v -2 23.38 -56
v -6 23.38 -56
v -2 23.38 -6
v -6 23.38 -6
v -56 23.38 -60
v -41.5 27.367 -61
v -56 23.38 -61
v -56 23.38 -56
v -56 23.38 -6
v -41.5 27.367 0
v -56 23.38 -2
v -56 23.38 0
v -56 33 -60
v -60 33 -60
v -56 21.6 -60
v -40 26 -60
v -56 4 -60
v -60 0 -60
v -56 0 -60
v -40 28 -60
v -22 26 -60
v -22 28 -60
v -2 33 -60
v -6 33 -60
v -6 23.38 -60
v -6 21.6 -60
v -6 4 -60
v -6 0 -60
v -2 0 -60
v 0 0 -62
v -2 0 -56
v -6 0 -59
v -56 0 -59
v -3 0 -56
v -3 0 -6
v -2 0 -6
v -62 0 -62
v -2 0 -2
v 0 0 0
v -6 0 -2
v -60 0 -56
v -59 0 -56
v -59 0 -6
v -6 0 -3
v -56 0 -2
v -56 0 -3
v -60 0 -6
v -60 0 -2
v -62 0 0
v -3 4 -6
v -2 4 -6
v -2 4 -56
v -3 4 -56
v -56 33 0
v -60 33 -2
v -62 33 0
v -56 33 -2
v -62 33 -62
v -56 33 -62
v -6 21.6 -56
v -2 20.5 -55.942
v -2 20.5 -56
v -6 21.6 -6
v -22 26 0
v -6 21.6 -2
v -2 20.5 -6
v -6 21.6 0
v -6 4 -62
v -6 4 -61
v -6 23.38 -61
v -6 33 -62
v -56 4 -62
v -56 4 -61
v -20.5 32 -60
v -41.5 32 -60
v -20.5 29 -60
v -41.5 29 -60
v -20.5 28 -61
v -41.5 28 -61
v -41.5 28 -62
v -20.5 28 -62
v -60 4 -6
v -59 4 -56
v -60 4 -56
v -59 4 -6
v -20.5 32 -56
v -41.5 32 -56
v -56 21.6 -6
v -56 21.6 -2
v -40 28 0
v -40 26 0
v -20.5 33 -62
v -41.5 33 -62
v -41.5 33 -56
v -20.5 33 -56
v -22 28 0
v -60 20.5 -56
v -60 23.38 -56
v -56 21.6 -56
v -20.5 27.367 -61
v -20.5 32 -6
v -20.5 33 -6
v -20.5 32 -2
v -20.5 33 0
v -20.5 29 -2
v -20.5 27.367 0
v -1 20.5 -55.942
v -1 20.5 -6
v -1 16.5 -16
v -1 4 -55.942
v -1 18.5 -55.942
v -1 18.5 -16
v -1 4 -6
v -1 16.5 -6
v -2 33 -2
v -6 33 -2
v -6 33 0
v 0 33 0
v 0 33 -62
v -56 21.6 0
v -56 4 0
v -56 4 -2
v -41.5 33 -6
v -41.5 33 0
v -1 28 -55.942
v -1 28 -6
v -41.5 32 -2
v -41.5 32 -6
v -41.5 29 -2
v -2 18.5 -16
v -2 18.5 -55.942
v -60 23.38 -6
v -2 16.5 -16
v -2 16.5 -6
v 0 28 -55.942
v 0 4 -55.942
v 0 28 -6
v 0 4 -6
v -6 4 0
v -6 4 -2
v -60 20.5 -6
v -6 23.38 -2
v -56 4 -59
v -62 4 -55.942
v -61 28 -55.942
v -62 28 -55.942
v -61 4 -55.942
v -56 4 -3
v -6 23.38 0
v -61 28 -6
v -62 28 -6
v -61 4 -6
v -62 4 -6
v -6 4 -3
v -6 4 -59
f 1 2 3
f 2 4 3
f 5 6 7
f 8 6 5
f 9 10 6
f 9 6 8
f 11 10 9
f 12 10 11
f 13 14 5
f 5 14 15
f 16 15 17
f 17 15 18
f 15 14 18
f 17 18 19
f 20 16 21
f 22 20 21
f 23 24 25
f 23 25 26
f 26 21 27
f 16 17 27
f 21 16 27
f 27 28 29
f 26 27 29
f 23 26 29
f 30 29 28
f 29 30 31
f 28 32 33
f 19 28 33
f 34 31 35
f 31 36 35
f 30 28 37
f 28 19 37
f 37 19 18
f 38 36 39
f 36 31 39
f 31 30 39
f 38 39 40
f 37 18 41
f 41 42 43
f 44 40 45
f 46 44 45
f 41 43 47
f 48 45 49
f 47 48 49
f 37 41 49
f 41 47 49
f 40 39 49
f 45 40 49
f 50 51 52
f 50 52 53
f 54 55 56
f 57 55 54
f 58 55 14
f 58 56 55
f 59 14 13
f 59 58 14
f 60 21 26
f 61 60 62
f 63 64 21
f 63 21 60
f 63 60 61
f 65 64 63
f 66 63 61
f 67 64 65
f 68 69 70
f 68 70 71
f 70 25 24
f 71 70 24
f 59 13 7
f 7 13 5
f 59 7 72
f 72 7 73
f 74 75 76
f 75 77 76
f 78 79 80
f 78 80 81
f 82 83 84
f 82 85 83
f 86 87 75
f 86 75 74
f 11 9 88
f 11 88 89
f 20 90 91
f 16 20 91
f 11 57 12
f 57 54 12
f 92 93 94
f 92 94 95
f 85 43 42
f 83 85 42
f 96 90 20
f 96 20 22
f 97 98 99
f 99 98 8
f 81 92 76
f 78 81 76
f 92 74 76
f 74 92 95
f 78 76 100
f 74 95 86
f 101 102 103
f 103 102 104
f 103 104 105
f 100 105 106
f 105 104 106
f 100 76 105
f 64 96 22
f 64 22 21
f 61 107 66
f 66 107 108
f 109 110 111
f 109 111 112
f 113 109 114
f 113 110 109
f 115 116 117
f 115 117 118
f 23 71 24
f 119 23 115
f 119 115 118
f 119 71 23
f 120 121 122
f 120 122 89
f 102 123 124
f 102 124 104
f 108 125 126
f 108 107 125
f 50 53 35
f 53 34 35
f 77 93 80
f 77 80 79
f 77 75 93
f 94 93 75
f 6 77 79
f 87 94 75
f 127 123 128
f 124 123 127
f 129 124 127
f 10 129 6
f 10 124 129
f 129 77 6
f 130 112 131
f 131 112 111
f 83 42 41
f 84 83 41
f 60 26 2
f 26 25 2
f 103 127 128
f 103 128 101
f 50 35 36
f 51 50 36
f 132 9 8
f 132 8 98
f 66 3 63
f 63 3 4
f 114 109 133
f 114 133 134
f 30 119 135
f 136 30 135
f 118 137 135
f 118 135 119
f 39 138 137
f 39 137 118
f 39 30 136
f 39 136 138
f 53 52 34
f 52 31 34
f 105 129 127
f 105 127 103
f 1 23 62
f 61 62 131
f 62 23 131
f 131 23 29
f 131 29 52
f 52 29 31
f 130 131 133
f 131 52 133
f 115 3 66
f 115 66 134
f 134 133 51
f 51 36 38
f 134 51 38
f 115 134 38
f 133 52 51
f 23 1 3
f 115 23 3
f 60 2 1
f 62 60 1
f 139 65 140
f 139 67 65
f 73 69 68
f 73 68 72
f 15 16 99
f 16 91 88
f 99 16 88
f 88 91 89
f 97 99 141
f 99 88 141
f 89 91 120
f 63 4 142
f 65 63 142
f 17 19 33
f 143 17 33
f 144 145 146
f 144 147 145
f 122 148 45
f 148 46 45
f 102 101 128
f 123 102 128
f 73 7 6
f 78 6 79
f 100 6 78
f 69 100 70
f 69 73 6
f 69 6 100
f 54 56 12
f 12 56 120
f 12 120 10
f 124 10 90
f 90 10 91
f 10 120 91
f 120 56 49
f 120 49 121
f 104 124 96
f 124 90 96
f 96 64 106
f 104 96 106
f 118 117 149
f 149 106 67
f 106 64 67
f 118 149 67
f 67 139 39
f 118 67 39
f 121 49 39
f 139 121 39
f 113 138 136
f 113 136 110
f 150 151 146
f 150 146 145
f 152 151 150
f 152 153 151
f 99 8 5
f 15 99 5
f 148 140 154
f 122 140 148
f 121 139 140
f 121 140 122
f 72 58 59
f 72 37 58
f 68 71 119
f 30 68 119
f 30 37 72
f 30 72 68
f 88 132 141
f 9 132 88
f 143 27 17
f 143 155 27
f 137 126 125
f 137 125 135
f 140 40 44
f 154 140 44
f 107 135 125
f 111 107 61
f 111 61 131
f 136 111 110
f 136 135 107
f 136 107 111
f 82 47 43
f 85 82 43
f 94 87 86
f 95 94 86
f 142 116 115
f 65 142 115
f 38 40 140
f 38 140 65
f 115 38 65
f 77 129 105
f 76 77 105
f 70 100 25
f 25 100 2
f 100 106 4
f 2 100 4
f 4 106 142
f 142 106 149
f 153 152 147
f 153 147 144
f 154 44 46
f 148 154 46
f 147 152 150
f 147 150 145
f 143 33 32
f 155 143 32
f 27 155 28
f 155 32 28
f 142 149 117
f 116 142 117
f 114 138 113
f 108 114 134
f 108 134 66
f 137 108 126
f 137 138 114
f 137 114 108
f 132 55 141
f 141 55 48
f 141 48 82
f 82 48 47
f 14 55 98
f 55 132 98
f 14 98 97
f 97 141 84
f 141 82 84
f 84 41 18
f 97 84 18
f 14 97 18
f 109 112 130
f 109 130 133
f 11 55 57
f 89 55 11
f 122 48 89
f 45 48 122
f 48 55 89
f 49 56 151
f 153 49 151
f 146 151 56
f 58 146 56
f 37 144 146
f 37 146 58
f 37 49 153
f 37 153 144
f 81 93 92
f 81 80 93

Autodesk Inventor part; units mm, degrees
ref_plane "YZ Plane" through (0, 0, 0) normal (1, 0, 0) x (0, 1, 0)
ref_plane "XZ Plane" through (0, 0, 0) normal (0, 1, 0) x (-1, 0, 0)
ref_plane "XY Plane" through (0, 0, 0) normal (0, 0, 1) x (1, 0, 0)
sketch "Skizze1" plane through (0, 0, 0) normal (0, 1, 0) x (-1, 0, 0)
  line L0 (0, 0) -> (62, 0)
  line L1 (62, 0) -> (62, -62)
  line L2 (62, -62) -> (0, -62)
  line L3 (0, -62) -> (0, 0)
  line L4 (2, -2) -> (6, -2)
  line L5 (6, -2) -> (6, -6)
  line L6 (6, -6) -> (2, -6)
  line L7 (2, -6) -> (2, -2)
  line L8 (2, -56) -> (6, -56)
  line L9 (6, -56) -> (6, -60)
  line L10 (6, -60) -> (2, -60)
  line L11 (2, -60) -> (2, -56)
  line L12 (56, -2) -> (60, -2)
  line L13 (60, -2) -> (60, -6)
  line L14 (60, -6) -> (56, -6)
  line L15 (56, -6) -> (56, -2)
  line L16 (56, -56) -> (60, -56)
  line L17 (60, -56) -> (60, -60)
  line L18 (60, -60) -> (56, -60)
  line L19 (56, -60) -> (56, -56)
  line L20 (3, -3) -> (59, -3)
  line L21 (59, -3) -> (59, -59)
  line L22 (59, -59) -> (3, -59)
  line L23 (3, -59) -> (3, -3)
  point P0 (2, -58)
  point P1 (6, -3)
  point P2 (56, -3)
  point P3 (59, -6)
  point P4 (59, -56)
  point P5 (56, -59)
  point P6 (6, -59)
  point P7 (3, -56)
  point P8 (3, -6)
  dimension "d0" = 62
  dimension "d1" = 62
  dimension "d2" = 4
  dimension "d3" = 4
  dimension "d4" = 4
  dimension "d5" = 4
  dimension "d6" = 4
  dimension "d7" = 50
  dimension "d8" = 50
  dimension "d9" = 2
  dimension "d10" = 2
  dimension "d11" = 2
  dimension "d12" = 56
  dimension "d13" = 56
extrude "Extrusion1" add sketch "Skizze1" along normal blind 4
sketch "Skizze2" plane through (0, 4, 0) normal (0, 1, 0) x (1, 0, 0)
  line L0 (-2, 2) -> (-6, 2) projected
  line L1 (-3, 6) -> (-2, 6) projected
  line L2 (-6, 2) -> (-2, 2)
  line L3 (-2, 2) -> (-2, 6)
  line L4 (-2, 6) -> (-6, 6)
  line L5 (-6, 6) -> (-6, 2)
  line L6 (-62, 0) -> (0, 0) projected
  line L7 (0, 0) -> (0, 62) projected
  line L8 (-6, 0) -> (0, 0)
  line L9 (0, 0) -> (0, 6)
  line L10 (0, 6) -> (-6, 6)
  line L11 (-6, 6) -> (-6, 0)
  line L12 (0, 62) -> (-62, 62) projected
  line L13 (0, 55.9421) -> (-6, 55.9421)
  line L14 (-6, 55.9421) -> (-6, 62)
  line L15 (-6, 62) -> (0, 62)
  line L16 (0, 62) -> (0, 55.9421)
  line L17 (-6, 59) -> (-6, 60) projected
  line L18 (-6, 60) -> (-2, 60)
  line L19 (-2, 60) -> (-2, 56)
  line L20 (-2, 56) -> (-6, 56)
  line L21 (-6, 56) -> (-6, 60)
  line L22 (-62, 62) -> (-56, 62)
  line L23 (-56, 62) -> (-56, 55.9421)
  line L24 (-56, 55.9421) -> (-62, 55.9421)
  line L25 (-62, 55.9421) -> (-62, 62)
  line L26 (-60, 60) -> (-56, 60) projected
  line L27 (-60, 60) -> (-56, 60)
  line L28 (-56, 60) -> (-56, 55.9421)
  line L29 (-56, 55.9421) -> (-60, 55.9421)
  line L30 (-60, 55.9421) -> (-60, 60)
  line L31 (-62, 62) -> (-62, 0) projected
  line L32 (-62, 6) -> (-56, 6)
  line L33 (-56, 6) -> (-56, 0)
  line L34 (-56, 0) -> (-62, 0)
  line L35 (-62, 0) -> (-62, 6)
  line L36 (-56, 2) -> (-60, 2)
  line L37 (-60, 2) -> (-60, 6)
  line L38 (-60, 6) -> (-56, 6)
  line L39 (-56, 6) -> (-56, 2)
extrude "Extrusion2" add sketch "Skizze2" along normal blind 25 contours L3 L10 L7 L6 L11 L0 | L6 L31 L32 L37 L36 L33 | L13 L14 L20 L19 L18 L12 L7 | L25 L12 L23 L26 L30 L24
sketch "Skizze3" plane through (0, 29, 0) normal (0, 1, 0) x (1, 0, 0)
  line L0 (-62, 0) -> (0, 0) projected
  line L1 (0, 0) -> (-62, 0)
  line L2 (-62, 0) -> (-62, 62)
  line L3 (-62, 62) -> (0, 62)
  line L4 (0, 62) -> (0, 0)
  line L5 (-6, 6) -> (-56, 6)
  line L6 (-56, 6) -> (-56, 56)
  line L7 (-56, 56) -> (-6, 56)
  line L8 (-6, 56) -> (-6, 6)
  line L9 (-60, 2) -> (-60, 6) projected
  line L10 (-56, 6) -> (-60, 6)
  line L11 (-60, 6) -> (-60, 2)
  line L12 (-60, 2) -> (-56, 2)
  line L13 (-56, 2) -> (-56, 6)
  line L14 (-60, 60) -> (-56, 60) projected
  line L15 (-56, 56) -> (-60, 56)
  line L16 (-60, 56) -> (-60, 60)
  line L17 (-60, 60) -> (-56, 60)
  line L18 (-56, 60) -> (-56, 56)
  line L19 (-3, 56) -> (-6, 56) projected
  line L20 (-2, 60) -> (-2, 56) projected
  line L21 (-6, 56) -> (-2, 56)
  line L22 (-2, 56) -> (-2, 60)
  line L23 (-2, 60) -> (-6, 60)
  line L24 (-6, 60) -> (-6, 56)
  line L25 (-2, 2) -> (-6, 2) projected
  line L26 (-6, 6) -> (-2, 6)
  line L27 (-2, 6) -> (-2, 2)
  line L28 (-2, 2) -> (-6, 2)
  line L29 (-6, 2) -> (-6, 6)
  dimension "d18" = 50
  dimension "d19" = 50
extrude "Extrusion3" add sketch "Skizze3" along normal blind 4
sketch "Skizze4" plane through (0, 29, 0) normal (0, -1, 0) x (1, 0, 0)
  line L0 (-6, -6) -> (-56, -6) projected
  line L1 (-6, -6) -> (-2, -6)
  line L2 (-2, -6) -> (-2, -56)
  line L3 (-2, -56) -> (-6, -56)
  line L4 (-6, -56) -> (-6, -6)
  line L5 (-6, -56) -> (-56, -56)
  line L6 (-56, -56) -> (-56, -60)
  line L7 (-56, -60) -> (-6, -60)
  line L8 (-6, -60) -> (-6, -56)
  line L9 (-56, -6) -> (-56, -2) projected
  line L10 (-56, -6) -> (-6, -6)
  line L11 (-6, -6) -> (-6, -2)
  line L12 (-6, -2) -> (-56, -2)
  line L13 (-56, -2) -> (-56, -6)
  line L14 (-60, -6) -> (-56, -6) projected
  line L15 (-56, -6) -> (-60, -6)
  line L16 (-60, -6) -> (-60, -56)
  line L17 (-60, -56) -> (-56, -56)
  line L18 (-56, -56) -> (-56, -6)
  point P0 (0, 0)
  dimension "d22" = 4
  dimension "d23" = 50
  dimension "d24" = 50
  dimension "d25" = 4
  dimension "d26" = 50
  dimension "d27" = 4
  dimension "d28" = 4
  dimension "d29" = 50
extrude "Extrusion4" cut sketch "Skizze4" against normal blind 2 contours L1 L2 L3 L4 | L0 L9 L12 L11 | L18 L17 L16 L14 | L8 L7 L6 L5
sketch "Skizze5" plane through (0, 31, 0) normal (0, -1, 0) x (1, 0, 0)
  line L0 (-59, -59) -> (-3, -59)
  line L1 (-3, -59) -> (-3, -3)
  line L2 (-59, -3) -> (-59, -59)
  line L3 (-57.5, -4.5) -> (-57.5, -57.5)
  line L4 (-57.5, -57.5) -> (-4.5, -57.5)
  line L5 (-4.5, -57.5) -> (-4.5, -4.5)
  line L6 (-62, 0) -> (0, 0) projected
  line L7 (0, 0) -> (0, -62) projected
  line L8 (-60, -60) -> (-56, -60) projected
  line L9 (-2, -6) -> (-2, -2) projected
  line L10 (-60, -60) -> (-2, -60)
  line L11 (-2, -60) -> (-2, -2)
  line L12 (-2, -2) -> (-60, -2)
  line L13 (-60, -2) -> (-60, -60)
  dimension "d32" = 56
  dimension "d33" = 56
  dimension "d34" = 53
  dimension "d35" = 53
  dimension "d36" = 1.5
  dimension "d39" = 3
extrude "Extrusion5" cut sketch "Skizze5" against normal blind 1
sketch "Skizze6" plane through (0, 32, 0) normal (0, -1, 0) x (1, 0, 0)
  line L0 (-60, -6) -> (-56, -6) projected
  line L1 (-56, -6) -> (-52, -6)
  line L2 (-6, -6) -> (-56, -6) projected
  line L3 (-52, -6) -> (-56, -10)
  line L4 (-56, -6) -> (-56, -56) projected
  line L5 (-56, -10) -> (-56, -6)
  line L6 (-6, -56) -> (-6, -6) projected
  line L7 (-6, -6) -> (-10, -6)
  line L8 (-6, -6) -> (-2, -6) construction
  line L9 (-10, -6) -> (-6, -10)
  line L10 (-6, -10) -> (-6, -6)
  line L11 (-6, -56) -> (-6, -60) projected
  line L12 (-6, -56) -> (-6, -52)
  line L13 (-6, -52) -> (-10, -56)
  line L14 (-56, -56) -> (-6, -56) projected
  line L15 (-56, -56) -> (-52, -56)
  line L16 (-56, -52) -> (-52, -56)
  line L17 (-56, -52) -> (-56, -56)
  point P0 (0, 0)
  dimension "d42" = 4
  dimension "d43" = 45
  dimension "d44" = 4
  dimension "d45" = 180
extrude "Extrusion6" add sketch "Skizze6" against normal blind 1 contours L1 L3 L4 | L2 L6 L9 | L16 L14 L4 | L6 L14 L13
sketch "Skizze7" plane through (-6, 4, -55.9421) normal (0, 0, 1) x (1, 0, 0)
  line L0 (3, 0) -> (0, 0) projected
  line L1 (0, 0) -> (4, 0)
  line L2 (4, 0) -> (4, 25)
  line L3 (4, 25) -> (0, 25)
  line L4 (0, 25) -> (0, 0)
  point P0 (6, -4)
extrude "Extrusion7" cut sketch "Skizze7" against normal blind 1
sketch "Skizze10" plane through (0, 29, 0) normal (0, -1, 0) x (1, 0, 0)
  line L0 (-2, -6) -> (-2, -55.9421) projected
  line L1 (-6, -6) -> (-2, -6) projected
  line L2 (-2, -6) -> (-6, -6)
  line L3 (-6, -2) -> (-6, -6) projected
  line L4 (-6, -6) -> (-6, -2)
  line L5 (-56, -3) -> (-56, -2) projected
  line L6 (-6, -2) -> (-56, -2)
  line L7 (-56, -6) -> (-56, -2) projected
  line L8 (-56, -2) -> (-56, -6)
  line L9 (-60, -6) -> (-56, -6) projected
  line L10 (-56, -6) -> (-60, -6)
  line L11 (-60, -56) -> (-60, -60) projected
  line L12 (-60, -6) -> (-60, -56)
  line L13 (-56, -56) -> (-60, -56) projected
  line L14 (-60, -56) -> (-56, -56)
  line L15 (-56, -60) -> (-56, -56) projected
  line L16 (-56, -56) -> (-56, -60)
  line L17 (-6, -59) -> (-6, -60) projected
  line L18 (-56, -60) -> (-6, -60)
  line L19 (-6, -56) -> (-6, -60) projected
  line L20 (-6, -60) -> (-6, -56)
  line L21 (-3, -56) -> (-2, -56) projected
  line L22 (-6, -56) -> (-2, -56)
  line L23 (-2, -56) -> (-2, -6)
  line L24 (0, -6) -> (0, -55.9421) projected
  line L25 (-2, -6) -> (0, -6)
  line L26 (0, -6) -> (0, -56)
  line L27 (0, -56) -> (-2, -56)
  line L28 (-6, -62) -> (-56, -62) projected
  line L29 (-6, -60) -> (-6, -62)
  line L30 (-6, -62) -> (-56, -62)
  line L31 (-56, -62) -> (-56, -60)
  line L32 (-56, 0) -> (-6, 0) projected
  line L33 (-56, -2) -> (-56, 0)
  line L34 (-56, 0) -> (-6, 0)
  line L35 (-6, -2) -> (-6, 0) projected
  line L36 (-6, 0) -> (-6, -2)
  line L37 (-60, -6) -> (-62, -6)
  line L38 (-62, -62) -> (-62, 0) projected
  line L39 (-62, -56) -> (-62, -6)
  line L40 (-59, -6) -> (-59, -56) projected
  line L41 (-62, -56) -> (-60, -56)
  point P0 (0, 0)
extrude "Extrusion8" add sketch "Skizze10" along normal blind 1
sketch "Skizze11" plane through (0, 0, 0) normal (0, -1, 0) x (1, 0, 0)
  line L0 (-60, -60) -> (-56, -60) projected
  line L1 (-2, -6) -> (-2, -2) projected
  line L2 (-60, -60) -> (-2, -60)
  line L3 (-2, -60) -> (-2, -2)
  line L4 (-2, -2) -> (-60, -2)
  line L5 (-60, -2) -> (-60, -60)
  line L6 (-1, -1) -> (-61, -1)
  line L7 (-61, -1) -> (-61, -61)
  line L8 (-61, -61) -> (-1, -61)
  line L9 (-1, -61) -> (-1, -1)
  point P0 (0, 0)
  dimension "d52" = 60
  dimension "d53" = 60
extrude "Extrusion9" add sketch "Skizze11" against normal blind 28
sketch "Skizze13" plane through (-56, 28, -1) normal (0, 0, 1) x (1, 0, 0)
  line L0 (0, -24) -> (50, -24) projected
  line L1 (0, 0) -> (-4, 0) projected
  line L2 (50, -24) -> (0, -24)
  line L3 (0, -24) -> (0, 0)
  line L4 (0, 0) -> (50, 0)
  line L5 (50, 0) -> (50, -24)
  point P0 (56, -28)
extrude "Extrusion10" cut sketch "Skizze13" against normal blind 1
sketch "Skizze16" plane through (-1, 4, -55.9421) normal (1, 0, 0) x (0, 0, -1)
  line L0 (0, 24) -> (0, 0) projected
  line L1 (-49.9421, 0) -> (-49.9421, 24) projected
  line L2 (0, 16.5) -> (-49.9421, 16.5)
  line L3 (-49.9421, 16.5) -> (-49.9421, 14.5)
  line L4 (-49.9421, 14.5) -> (0, 14.5)
  line L5 (0, 14.5) -> (0, 16.5)
  point P0 (-55.9421, -4)
  point P1 (-49.9421, 16.5)
  dimension "d67" = 2
extrude "Extrusion13" cut sketch "Skizze16" against normal blind 5
sketch "Skizze18" plane through (-62, 0, 0) normal (0, 0, 1) x (1, 0, 0)
  line L0 (2, 28) -> (6, 28) projected
  line L1 (2, 28) -> (22, 28)
  line L2 (2, 28) -> (22, 28) construction
  line L3 (22, 28) -> (22, 26)
  line L4 (56, 28) -> (60, 28) projected
  line L5 (60, 28) -> (40, 28)
  line L6 (6, 28) -> (56, 28) projected
  line L7 (40, 28) -> (40, 26)
  line L8 (61, 20.5) -> (60, 20.5) projected
  line L9 (40, 26) -> (60, 20.5)
  line L10 (60, 20.5) -> (60, 28)
  line L11 (22, 26) -> (2, 20.5)
  line L12 (2, 0) -> (2, 33) projected
  line L13 (2, 28) -> (2, 20.5)
  point P0 (62, 0)
  dimension "d71" = 20
  dimension "d72" = 0
  dimension "d73" = 2
  dimension "d74" = 20
extrude "Extrusion14" add sketch "Skizze18" against normal blind 60
sketch "Skizze19" plane through (-62, 0, 0) normal (0, 0, 1) x (1, 0, 0)
  line L0 (56, 23.3797) -> (56, 33)
  line L1 (0, 33) -> (62, 33) projected
  line L2 (56, 33) -> (52, 33) projected
  line L3 (56, 33) -> (41.5, 33)
  line L4 (52, 33) -> (10, 33) projected
  line L5 (56, 33) -> (70.5, 33) construction
  line L6 (41.5, 33) -> (41.5, 27.3672)
  line L7 (56, 28) -> (6, 28) projected
  line L8 (41.5, 27.3672) -> (56, 23.3797)
  line L9 (40, 26) -> (56, 21.6) projected
  line L10 (6, 28) -> (6, 4) projected
  line L11 (6, 23.3797) -> (6, 33)
  line L12 (10, 33) -> (6, 33) projected
  line L13 (6, 33) -> (20.5, 33)
  line L14 (20.5, 33) -> (20.5, 27.3672)
  line L15 (20.5, 27.3672) -> (6, 23.3797)
  point P0 (62, 0)
  dimension "d77" = 14.5
  dimension "d78" = 180
  dimension "d79" = 14.5
extrude "Extrusion15" cut sketch "Skizze19" against normal blind 71.1125 contours L8 L6 L7 L0 | L7 L6 L1 L0 | L14 L15 L10 L7 | L7 L11 L1 L14
sketch "Skizze20" plane through (-1, 4, -6) normal (1, 0, 0) x (0, 0, -1)
  line L0 (0, 16.5) -> (49.9421, 16.5) projected
  line L1 (0, 16.5) -> (10, 16.5)
  line L2 (10, 16.5) -> (10, 12.5)
  line L3 (10, 12.5) -> (0, 12.5)
  line L4 (0, 12.5) -> (0, 16.5)
  point P0 (-6, -4)
  dimension "d82" = 10
  dimension "d83" = 4
extrude "Extrusion16" cut sketch "Skizze20" against normal blind 2
sketch "Skizze21" plane through (0, 33, 0) normal (0, 1, 0) x (1, 0, 0)
  line L0 (-1, 6) -> (-2, 6) projected
  line L1 (-6, 0) -> (-6, 2) projected
  line L2 (-2, 6) -> (-6, 6)
  line L3 (-6, 6) -> (-6, 2)
  line L4 (-6, 2) -> (-2, 2)
  line L5 (-2, 2) -> (-2, 6)
  line L6 (-56, 2) -> (-60, 2)
  line L7 (-60, 2) -> (-60, 6)
  line L8 (-60, 6) -> (-56, 6)
  line L9 (-56, 6) -> (-56, 2)
  line L10 (-60, 56) -> (-60, 60) projected
  line L11 (-60, 60) -> (-56, 60) projected
  line L12 (-60, 56) -> (-56, 56)
  line L13 (-56, 56) -> (-56, 60)
  line L14 (-56, 60) -> (-60, 60)
  line L15 (-60, 60) -> (-60, 56)
  line L16 (-6, 60) -> (-2, 60) projected
  line L17 (-6, 56) -> (-2, 56) projected
  line L18 (-2, 60) -> (-6, 60)
  line L19 (-6, 60) -> (-6, 56)
  line L20 (-6, 56) -> (-2, 56)
  line L21 (-2, 56) -> (-2, 60)
  point P0 (0, 0)
extrude "Extrusion17" cut sketch "Skizze21" against normal blind 20
sketch "Skizze22" plane through (-60, 29, -6) normal (0, 0, 1) x (1, 0, 0)
  line L0 (54, 0) -> (54, -5.6203) projected
  line L1 (58, 3) -> (58, 4) projected
  line L2 (54, -5.6203) -> (58, -5.6203)
  line L3 (58, -5.6203) -> (58, 4)
  line L4 (58, 4) -> (54, 4)
  line L5 (54, 4) -> (54, -5.6203)
  line L6 (4, 0) -> (4, -5.6203) projected
  line L7 (0, -29) -> (0, 4) projected
  line L8 (4, -5.6203) -> (0, -5.6203)
  line L9 (0, -5.6203) -> (0, 4)
  line L10 (0, 4) -> (4, 4)
  line L11 (4, 4) -> (4, -5.6203)
  point P0 (60, -29)
extrude "Extrusion18" cut sketch "Skizze22" against normal blind 51.4375
properties part number "Unterbau V3"
